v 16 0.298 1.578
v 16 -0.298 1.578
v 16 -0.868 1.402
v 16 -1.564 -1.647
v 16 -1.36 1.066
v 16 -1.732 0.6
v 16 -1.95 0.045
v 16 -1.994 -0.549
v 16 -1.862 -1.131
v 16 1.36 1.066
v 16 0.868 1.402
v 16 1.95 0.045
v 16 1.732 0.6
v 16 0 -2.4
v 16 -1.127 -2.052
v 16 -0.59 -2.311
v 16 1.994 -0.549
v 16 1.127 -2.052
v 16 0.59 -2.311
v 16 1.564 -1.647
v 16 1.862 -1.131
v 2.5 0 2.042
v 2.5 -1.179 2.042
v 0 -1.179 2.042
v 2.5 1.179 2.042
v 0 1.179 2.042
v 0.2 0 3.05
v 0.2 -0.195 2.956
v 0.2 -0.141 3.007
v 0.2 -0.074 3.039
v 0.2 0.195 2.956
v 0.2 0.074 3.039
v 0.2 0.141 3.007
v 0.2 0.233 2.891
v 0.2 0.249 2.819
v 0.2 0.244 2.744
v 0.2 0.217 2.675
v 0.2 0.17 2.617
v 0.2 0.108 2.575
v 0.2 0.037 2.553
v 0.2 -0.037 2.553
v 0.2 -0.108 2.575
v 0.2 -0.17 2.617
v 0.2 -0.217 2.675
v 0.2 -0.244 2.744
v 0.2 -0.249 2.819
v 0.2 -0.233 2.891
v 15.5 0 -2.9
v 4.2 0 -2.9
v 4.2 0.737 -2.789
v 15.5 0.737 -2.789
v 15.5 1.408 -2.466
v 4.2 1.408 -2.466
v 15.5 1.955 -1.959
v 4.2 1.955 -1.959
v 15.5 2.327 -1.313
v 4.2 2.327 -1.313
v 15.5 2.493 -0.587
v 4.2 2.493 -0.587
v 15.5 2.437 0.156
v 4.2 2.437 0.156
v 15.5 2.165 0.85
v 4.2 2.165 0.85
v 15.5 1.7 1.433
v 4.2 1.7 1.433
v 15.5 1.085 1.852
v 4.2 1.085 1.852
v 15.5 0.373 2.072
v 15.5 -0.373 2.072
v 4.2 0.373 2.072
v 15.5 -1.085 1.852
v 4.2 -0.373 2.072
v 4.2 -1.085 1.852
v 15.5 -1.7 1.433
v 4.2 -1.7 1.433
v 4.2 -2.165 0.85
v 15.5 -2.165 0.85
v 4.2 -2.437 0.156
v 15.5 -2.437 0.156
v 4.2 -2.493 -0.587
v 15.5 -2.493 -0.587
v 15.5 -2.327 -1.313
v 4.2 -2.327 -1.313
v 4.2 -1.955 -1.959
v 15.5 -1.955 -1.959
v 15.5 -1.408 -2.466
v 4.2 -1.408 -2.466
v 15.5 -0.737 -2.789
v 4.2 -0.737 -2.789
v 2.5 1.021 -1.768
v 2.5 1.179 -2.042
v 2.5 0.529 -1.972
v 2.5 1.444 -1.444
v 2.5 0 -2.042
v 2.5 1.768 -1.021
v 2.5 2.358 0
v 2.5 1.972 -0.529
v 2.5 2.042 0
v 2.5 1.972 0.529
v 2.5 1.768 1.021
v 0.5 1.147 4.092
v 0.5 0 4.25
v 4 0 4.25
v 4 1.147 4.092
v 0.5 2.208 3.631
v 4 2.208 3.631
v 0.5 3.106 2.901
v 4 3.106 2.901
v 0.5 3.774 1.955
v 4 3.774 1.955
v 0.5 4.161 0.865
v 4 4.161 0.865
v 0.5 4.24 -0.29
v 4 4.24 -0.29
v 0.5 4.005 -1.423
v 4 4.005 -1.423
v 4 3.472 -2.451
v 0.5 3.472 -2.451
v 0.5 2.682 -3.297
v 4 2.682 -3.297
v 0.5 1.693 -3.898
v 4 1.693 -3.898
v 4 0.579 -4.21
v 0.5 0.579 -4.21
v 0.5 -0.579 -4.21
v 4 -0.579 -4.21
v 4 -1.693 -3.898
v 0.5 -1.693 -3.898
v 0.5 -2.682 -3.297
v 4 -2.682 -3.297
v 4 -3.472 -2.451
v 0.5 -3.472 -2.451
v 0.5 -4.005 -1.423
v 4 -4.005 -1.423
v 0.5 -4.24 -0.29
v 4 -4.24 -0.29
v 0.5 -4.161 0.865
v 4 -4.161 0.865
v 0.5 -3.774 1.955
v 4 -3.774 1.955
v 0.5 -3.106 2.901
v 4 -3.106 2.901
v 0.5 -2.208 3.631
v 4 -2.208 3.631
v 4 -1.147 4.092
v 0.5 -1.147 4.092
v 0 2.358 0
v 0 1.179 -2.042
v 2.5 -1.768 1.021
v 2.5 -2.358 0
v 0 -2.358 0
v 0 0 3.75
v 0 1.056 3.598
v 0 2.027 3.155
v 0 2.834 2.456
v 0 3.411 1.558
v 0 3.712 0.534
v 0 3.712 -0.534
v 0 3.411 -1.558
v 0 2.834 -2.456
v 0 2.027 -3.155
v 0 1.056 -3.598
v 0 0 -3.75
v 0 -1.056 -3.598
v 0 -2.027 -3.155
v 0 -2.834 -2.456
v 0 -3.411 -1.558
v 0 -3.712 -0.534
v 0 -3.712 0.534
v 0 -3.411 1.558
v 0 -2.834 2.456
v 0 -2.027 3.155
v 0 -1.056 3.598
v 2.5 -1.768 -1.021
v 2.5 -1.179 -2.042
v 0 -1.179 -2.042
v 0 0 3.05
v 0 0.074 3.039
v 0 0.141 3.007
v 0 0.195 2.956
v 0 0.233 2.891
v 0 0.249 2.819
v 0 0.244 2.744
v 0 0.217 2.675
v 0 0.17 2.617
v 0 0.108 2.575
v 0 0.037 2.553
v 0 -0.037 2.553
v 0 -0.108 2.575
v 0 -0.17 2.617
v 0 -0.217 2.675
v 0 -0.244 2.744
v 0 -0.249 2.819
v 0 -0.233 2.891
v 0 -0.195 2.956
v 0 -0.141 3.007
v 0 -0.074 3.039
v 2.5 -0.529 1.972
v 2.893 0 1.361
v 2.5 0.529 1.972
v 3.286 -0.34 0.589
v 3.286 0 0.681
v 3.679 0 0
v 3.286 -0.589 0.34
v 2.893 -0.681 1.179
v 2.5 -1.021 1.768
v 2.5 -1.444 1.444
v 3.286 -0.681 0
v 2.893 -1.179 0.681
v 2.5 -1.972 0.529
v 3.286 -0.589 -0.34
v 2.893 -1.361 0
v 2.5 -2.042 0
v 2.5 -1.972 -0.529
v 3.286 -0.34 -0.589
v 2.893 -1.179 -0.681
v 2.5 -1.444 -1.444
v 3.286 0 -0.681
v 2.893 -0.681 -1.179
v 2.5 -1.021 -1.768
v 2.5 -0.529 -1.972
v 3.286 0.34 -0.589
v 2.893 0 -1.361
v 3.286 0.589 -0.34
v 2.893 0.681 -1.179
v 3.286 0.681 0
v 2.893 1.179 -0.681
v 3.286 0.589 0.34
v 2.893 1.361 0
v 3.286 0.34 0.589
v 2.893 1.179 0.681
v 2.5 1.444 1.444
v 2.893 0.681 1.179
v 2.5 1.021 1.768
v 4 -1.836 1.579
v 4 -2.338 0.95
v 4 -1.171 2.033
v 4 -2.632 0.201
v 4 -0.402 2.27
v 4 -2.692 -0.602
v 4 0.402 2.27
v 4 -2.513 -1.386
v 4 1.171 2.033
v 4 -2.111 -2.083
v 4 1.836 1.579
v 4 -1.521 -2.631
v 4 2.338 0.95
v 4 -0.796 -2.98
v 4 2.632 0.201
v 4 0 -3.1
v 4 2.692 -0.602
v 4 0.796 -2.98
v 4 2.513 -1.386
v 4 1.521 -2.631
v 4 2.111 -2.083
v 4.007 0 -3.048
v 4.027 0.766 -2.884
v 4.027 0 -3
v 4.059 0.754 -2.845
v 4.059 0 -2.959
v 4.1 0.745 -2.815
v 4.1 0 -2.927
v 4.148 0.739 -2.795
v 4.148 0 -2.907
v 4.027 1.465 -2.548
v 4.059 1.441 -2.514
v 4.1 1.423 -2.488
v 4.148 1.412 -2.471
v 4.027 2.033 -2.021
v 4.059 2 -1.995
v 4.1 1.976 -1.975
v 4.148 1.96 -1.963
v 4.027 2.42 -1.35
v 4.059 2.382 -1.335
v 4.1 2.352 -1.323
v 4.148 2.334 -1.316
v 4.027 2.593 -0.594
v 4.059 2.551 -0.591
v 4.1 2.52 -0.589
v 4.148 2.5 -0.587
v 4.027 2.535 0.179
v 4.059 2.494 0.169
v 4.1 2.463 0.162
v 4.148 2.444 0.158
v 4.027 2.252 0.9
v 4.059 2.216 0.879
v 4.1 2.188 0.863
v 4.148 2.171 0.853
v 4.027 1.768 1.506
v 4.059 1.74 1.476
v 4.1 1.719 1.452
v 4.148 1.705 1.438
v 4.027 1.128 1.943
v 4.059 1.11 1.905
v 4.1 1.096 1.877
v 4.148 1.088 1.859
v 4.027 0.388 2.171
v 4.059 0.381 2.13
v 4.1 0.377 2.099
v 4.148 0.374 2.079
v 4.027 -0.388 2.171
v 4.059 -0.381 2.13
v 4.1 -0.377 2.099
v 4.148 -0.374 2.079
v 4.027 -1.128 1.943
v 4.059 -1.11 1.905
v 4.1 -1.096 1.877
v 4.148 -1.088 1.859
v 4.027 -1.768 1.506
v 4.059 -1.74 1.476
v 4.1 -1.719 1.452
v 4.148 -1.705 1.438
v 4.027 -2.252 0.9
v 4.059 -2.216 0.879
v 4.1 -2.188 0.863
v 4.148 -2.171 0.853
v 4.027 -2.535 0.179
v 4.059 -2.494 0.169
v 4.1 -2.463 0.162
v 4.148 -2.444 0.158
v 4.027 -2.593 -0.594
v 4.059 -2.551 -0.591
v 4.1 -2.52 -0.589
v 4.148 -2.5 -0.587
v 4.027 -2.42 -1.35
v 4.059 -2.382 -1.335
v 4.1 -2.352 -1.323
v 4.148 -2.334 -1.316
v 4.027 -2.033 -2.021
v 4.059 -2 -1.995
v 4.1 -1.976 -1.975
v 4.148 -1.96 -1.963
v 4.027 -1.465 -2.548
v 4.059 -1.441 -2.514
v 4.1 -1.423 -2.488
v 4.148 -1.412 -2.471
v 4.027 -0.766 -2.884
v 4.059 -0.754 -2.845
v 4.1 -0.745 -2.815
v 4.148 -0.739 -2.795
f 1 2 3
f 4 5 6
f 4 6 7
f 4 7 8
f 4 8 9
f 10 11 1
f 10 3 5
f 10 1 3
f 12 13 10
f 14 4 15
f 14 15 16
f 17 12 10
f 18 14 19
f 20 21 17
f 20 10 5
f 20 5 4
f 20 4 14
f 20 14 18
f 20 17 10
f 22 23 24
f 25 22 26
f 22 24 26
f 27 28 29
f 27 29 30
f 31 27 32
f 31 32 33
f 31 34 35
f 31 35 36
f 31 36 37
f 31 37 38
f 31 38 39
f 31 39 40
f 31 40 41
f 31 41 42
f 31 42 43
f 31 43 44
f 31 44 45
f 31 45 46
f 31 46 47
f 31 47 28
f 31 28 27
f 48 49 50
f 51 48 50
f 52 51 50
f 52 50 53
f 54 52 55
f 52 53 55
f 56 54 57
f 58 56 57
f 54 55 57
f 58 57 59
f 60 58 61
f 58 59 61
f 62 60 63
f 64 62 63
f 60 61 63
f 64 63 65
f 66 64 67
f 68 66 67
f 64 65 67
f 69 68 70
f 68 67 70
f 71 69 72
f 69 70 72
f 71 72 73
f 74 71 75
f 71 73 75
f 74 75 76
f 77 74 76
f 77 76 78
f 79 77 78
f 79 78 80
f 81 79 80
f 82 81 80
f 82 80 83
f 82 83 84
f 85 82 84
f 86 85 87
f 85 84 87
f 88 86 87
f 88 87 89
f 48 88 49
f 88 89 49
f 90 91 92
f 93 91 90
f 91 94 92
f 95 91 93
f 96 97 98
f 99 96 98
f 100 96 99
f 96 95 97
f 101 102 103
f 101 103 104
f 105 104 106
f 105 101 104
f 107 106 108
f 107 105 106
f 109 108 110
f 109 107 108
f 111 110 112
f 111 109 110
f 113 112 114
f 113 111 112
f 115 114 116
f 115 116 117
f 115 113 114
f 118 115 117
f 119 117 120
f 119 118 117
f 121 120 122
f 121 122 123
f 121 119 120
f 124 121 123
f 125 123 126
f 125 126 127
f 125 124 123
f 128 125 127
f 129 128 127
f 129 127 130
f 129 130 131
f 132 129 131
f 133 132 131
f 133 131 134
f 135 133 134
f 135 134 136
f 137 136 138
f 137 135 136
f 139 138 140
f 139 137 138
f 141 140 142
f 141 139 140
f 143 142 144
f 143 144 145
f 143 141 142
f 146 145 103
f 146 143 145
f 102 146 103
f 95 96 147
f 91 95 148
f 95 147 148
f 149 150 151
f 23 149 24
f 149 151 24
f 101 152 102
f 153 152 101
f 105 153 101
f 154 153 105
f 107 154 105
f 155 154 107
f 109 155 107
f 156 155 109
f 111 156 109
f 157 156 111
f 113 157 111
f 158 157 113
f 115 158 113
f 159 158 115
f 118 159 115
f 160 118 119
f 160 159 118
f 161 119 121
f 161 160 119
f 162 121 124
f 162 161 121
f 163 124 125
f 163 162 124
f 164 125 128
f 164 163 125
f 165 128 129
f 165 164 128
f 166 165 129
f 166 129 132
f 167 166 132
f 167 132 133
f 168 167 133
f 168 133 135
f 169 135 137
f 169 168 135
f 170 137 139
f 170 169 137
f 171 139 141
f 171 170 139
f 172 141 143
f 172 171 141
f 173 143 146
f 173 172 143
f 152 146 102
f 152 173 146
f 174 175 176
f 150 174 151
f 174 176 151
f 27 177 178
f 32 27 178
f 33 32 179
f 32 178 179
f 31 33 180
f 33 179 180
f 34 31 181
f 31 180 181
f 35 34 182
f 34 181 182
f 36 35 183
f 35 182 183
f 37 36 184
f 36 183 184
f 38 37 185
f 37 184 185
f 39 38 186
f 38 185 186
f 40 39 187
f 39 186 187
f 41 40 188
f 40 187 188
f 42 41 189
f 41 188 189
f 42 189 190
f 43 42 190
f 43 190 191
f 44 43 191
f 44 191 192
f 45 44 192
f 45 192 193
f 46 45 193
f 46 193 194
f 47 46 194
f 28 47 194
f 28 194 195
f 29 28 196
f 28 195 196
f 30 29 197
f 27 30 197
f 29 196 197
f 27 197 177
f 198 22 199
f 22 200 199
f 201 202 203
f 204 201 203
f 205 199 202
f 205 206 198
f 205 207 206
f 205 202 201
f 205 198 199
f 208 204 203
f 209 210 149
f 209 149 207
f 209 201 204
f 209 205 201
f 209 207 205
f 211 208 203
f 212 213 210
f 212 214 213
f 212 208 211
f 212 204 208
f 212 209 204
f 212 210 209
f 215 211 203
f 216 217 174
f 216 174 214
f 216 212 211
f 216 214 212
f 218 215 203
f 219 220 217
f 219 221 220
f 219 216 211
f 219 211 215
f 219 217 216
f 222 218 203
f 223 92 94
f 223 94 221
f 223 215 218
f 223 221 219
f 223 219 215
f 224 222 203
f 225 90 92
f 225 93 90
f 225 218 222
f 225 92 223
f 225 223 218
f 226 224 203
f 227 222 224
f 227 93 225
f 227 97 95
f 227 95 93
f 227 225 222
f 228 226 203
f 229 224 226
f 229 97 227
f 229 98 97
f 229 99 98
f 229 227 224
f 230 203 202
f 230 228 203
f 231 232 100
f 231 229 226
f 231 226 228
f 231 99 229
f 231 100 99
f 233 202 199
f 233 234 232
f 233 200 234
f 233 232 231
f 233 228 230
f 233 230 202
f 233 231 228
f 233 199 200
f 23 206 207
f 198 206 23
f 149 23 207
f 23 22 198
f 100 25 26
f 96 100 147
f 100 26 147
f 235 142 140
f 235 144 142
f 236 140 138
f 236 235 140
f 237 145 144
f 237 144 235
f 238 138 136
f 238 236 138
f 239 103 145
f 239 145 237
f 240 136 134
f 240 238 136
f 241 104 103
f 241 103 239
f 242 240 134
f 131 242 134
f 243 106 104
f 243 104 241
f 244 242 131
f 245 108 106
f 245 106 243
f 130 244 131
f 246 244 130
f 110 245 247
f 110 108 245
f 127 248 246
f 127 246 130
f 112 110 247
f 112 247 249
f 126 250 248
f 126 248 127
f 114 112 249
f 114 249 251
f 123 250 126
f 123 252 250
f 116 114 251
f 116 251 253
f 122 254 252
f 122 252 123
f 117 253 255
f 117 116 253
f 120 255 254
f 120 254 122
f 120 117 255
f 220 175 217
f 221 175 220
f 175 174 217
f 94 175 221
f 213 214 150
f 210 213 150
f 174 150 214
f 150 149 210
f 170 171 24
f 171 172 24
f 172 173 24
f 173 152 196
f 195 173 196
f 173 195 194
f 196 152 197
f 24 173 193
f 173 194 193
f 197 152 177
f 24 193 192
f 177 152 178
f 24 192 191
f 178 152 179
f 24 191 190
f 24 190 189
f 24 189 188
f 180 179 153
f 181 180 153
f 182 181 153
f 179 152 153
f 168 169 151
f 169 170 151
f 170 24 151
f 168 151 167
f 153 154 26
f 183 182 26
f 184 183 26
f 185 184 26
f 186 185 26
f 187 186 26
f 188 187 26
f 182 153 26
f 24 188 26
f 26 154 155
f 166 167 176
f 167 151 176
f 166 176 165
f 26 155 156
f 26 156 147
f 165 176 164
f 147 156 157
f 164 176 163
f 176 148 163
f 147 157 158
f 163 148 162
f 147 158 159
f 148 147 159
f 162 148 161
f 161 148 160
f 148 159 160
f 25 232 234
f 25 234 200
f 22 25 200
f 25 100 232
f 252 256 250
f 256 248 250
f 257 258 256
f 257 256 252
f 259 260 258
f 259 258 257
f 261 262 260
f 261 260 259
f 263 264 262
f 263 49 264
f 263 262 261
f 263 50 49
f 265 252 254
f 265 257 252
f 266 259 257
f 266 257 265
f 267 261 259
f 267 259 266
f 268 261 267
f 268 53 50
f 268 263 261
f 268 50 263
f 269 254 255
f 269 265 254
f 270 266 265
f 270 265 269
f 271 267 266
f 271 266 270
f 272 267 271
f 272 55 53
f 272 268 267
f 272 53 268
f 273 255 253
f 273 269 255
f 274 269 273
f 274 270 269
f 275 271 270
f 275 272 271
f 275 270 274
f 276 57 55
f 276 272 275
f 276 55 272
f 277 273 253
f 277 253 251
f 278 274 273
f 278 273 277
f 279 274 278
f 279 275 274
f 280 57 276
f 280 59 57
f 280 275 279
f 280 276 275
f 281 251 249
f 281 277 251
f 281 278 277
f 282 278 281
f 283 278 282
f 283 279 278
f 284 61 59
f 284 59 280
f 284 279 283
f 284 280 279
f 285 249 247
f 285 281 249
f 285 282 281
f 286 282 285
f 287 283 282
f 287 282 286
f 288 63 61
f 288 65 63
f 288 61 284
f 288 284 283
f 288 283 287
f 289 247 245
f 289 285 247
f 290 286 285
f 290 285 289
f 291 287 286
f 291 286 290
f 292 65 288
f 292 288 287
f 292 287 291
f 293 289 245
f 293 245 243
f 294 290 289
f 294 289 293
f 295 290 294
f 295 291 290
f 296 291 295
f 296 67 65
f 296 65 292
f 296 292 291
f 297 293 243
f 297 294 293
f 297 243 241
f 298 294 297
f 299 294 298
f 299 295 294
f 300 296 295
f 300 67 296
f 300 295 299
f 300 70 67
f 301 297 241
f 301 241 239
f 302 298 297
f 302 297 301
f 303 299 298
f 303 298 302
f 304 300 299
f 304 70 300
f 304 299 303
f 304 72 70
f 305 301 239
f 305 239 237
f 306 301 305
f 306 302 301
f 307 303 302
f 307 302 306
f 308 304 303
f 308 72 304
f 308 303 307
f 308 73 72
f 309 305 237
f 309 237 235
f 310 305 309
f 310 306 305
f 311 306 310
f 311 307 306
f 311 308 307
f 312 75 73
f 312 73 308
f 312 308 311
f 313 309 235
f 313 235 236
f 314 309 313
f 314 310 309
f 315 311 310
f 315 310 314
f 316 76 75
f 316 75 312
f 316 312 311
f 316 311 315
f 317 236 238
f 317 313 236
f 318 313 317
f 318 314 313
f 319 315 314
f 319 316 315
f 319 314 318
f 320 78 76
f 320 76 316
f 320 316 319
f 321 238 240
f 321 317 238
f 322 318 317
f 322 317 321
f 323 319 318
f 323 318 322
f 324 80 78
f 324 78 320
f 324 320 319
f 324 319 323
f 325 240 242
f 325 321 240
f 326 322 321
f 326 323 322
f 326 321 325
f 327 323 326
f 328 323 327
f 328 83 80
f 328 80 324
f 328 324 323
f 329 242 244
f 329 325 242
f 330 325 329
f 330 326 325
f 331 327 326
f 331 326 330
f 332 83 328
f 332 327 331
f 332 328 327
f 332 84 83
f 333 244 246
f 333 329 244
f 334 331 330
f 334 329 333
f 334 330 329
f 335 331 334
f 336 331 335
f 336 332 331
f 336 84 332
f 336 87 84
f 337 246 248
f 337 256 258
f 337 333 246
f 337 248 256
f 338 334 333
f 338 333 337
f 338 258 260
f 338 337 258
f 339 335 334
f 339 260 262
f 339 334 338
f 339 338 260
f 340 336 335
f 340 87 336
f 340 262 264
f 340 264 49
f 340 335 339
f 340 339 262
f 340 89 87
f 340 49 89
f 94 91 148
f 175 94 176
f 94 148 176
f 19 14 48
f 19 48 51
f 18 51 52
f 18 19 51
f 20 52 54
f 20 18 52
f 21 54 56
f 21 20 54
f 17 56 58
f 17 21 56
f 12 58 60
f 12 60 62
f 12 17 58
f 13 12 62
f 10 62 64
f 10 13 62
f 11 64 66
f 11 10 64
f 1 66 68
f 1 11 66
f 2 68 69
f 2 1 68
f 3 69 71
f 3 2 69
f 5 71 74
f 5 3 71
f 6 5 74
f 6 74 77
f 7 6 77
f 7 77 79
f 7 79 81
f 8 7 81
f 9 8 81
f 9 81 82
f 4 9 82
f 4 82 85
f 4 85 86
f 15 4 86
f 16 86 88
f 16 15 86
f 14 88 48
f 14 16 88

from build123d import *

# Parameters (mm, degrees)
ESBO_O1_W                = 4
ESBO_O1_H                = 4.25
ESBO_O2_R                = 2.5
RESSALTO_EXTRUS_O1_DEPTH = 12
CORTE_EXTRUS_O1_DEPTH    = 2.5
CHANFRO1_SIZE            = 0.5
FILETE1_R                = 0.2
SKETCH1_R                = 0.25
CUT_EXTRUDE1_DEPTH       = 0.2


with BuildPart() as part:
    # Esboço1 → Revolução1 (revolve)
    with BuildSketch(Plane(origin=(0, 0, 0), x_dir=(-1, 0, 0), z_dir=(0, 0, -1)), mode=Mode.PRIVATE) as revolu_o1_sk:
        with Locations((-2, 2.125)):
            Rectangle(ESBO_O1_W, ESBO_O1_H)
    revolve(revolu_o1_sk.sketch.rotate(Axis((4, 0, 0), (-1, 0, 0)), 270), axis=Axis((4, 0, 0), (-1, 0, 0)))

    # Esboço2 → Ressalto-extrusão1 (add)
    with BuildSketch(Plane(origin=(4, 0, 0), x_dir=(0, 0, -1), z_dir=(1, 0, 0))):
        with Locations((0.4, 0)):
            Circle(ESBO_O2_R)
    extrude(amount=RESSALTO_EXTRUS_O1_DEPTH)

    # Esboço3 → Corte-extrusão1 (cut)
    with BuildSketch(Plane.ZY):
        Polygon((0, -2.357898499), (2.042, -1.17894925), (2.042, 1.17894925), (0, 2.357898499), (-2.042, 1.17894925), (-2.042, -1.17894925), align=None)
    extrude(amount=-CORTE_EXTRUS_O1_DEPTH, mode=Mode.SUBTRACT)

    # Esboço4 → Corte-Revolução1 (revolve, cut)
    with BuildSketch(Plane.XY, mode=Mode.PRIVATE) as corte_revolu_o1_sk:
        Polygon((2.5, 2.042), (2.5, 0), (3.67894925, 0), align=None)
    revolve(corte_revolu_o1_sk.sketch.rotate(Axis((2.5, 0, 0), (1, 0, 0)), 90), axis=Axis((2.5, 0, 0), (1, 0, 0)), mode=Mode.SUBTRACT)

    # Chanfro1
    chanfro1_edges = [part.edges().sort_by_distance(p)[0] for p in [
        (0, 0, -4.25),
        (16, 0, 2.1),
    ]]
    chamfer(chanfro1_edges, length=CHANFRO1_SIZE)

    # Filete1
    filete1_edges = [part.edges().sort_by_distance(p)[0] for p in [
        (4, 0, 2.1),
    ]]
    fillet(filete1_edges, radius=FILETE1_R)

    # Sketch1 → Cut-Extrude1 (cut)
    with BuildSketch(Plane.ZY):
        with Locations((2.8, 0)):
            Circle(SKETCH1_R)
    extrude(amount=-CUT_EXTRUDE1_DEPTH, mode=Mode.SUBTRACT)


solid = part.part
